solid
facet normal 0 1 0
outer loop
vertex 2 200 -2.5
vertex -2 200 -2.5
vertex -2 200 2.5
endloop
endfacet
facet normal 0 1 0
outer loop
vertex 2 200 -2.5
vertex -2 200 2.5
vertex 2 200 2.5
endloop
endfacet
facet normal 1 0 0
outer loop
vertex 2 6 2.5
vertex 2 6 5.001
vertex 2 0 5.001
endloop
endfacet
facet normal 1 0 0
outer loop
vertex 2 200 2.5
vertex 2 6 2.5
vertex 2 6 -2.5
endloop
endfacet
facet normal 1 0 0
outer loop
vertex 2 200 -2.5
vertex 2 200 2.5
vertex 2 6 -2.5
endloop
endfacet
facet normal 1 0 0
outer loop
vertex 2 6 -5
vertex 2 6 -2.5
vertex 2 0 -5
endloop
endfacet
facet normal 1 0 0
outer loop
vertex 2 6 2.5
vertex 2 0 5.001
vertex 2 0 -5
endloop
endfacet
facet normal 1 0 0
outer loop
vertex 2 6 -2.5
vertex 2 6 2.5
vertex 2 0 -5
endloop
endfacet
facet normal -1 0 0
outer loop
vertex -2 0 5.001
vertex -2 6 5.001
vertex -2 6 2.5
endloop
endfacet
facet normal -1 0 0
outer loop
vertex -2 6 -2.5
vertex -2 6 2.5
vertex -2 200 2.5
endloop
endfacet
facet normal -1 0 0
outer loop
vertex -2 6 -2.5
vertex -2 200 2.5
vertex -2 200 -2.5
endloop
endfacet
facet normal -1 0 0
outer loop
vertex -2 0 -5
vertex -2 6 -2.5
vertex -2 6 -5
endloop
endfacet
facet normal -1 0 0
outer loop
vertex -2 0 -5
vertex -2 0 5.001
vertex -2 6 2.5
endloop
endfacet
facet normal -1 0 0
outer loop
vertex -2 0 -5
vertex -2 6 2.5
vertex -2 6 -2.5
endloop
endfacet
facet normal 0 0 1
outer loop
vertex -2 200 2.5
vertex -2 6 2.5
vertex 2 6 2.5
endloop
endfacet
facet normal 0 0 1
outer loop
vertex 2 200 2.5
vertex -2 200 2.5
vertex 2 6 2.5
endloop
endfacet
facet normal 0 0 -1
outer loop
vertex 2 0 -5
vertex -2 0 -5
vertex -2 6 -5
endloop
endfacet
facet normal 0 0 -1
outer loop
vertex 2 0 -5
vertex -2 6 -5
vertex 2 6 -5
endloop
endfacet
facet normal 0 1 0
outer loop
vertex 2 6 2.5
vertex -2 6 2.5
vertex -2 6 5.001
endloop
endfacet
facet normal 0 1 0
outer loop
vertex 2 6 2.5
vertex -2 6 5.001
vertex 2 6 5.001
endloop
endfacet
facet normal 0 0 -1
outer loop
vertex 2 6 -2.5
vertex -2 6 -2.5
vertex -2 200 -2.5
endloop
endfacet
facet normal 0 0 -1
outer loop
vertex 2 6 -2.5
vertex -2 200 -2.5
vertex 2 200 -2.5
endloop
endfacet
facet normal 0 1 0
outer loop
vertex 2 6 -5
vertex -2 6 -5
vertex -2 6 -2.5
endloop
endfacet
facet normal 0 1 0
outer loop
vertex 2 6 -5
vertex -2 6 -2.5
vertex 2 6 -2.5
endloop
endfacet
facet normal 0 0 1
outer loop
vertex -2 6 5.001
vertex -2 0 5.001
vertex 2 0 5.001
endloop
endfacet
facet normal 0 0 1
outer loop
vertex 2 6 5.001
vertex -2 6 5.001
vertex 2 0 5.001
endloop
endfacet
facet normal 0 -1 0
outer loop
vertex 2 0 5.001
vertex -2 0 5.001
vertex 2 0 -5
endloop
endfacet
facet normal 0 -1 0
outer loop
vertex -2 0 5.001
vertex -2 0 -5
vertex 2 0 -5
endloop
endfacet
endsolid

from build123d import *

# Parameters (mm, degrees)
SKETCH1_W             = 4
SKETCH1_H             = 2.501095517
BOSS_EXTRUDE1_DEPTH   = 6
SKETCH1_H_2           = 2.5
BOSS_EXTRUDE1_2_DEPTH = 6
SKETCH1_3_W           = 4
SKETCH1_3_H           = 5
BOSS_EXTRUDE2_DEPTH   = 200


with BuildPart() as part:
    # Sketch1 → Boss-Extrude1 (new body)
    with BuildSketch(Plane(origin=(0, 0, 0), x_dir=(1, 0, 0), z_dir=(0, 1, 0))):
        with Locations((0, -3.750547759)):
            Rectangle(SKETCH1_W, SKETCH1_H)
    extrude(amount=BOSS_EXTRUDE1_DEPTH)



with BuildPart() as body_2:
    # Sketch1 → Boss-Extrude1 2 (new body)
    with BuildSketch(Plane(origin=(0, 0, 0), x_dir=(1, 0, 0), z_dir=(0, 1, 0))):
        with Locations((0, 3.75)):
            Rectangle(SKETCH1_W, SKETCH1_H_2)
    extrude(amount=BOSS_EXTRUDE1_2_DEPTH)


with BuildPart() as part_1:
    add(part.part)

    add(body_2.part)  # Boss-Extrude2 merges body 2
    # Sketch1<3> → Boss-Extrude2 (add)
    with BuildSketch(Plane(origin=(0, 0, 0), x_dir=(1, 0, 0), z_dir=(0, 1, 0))):
        Rectangle(SKETCH1_3_W, SKETCH1_3_H)
    extrude(amount=BOSS_EXTRUDE2_DEPTH)


solid = part_1.part
